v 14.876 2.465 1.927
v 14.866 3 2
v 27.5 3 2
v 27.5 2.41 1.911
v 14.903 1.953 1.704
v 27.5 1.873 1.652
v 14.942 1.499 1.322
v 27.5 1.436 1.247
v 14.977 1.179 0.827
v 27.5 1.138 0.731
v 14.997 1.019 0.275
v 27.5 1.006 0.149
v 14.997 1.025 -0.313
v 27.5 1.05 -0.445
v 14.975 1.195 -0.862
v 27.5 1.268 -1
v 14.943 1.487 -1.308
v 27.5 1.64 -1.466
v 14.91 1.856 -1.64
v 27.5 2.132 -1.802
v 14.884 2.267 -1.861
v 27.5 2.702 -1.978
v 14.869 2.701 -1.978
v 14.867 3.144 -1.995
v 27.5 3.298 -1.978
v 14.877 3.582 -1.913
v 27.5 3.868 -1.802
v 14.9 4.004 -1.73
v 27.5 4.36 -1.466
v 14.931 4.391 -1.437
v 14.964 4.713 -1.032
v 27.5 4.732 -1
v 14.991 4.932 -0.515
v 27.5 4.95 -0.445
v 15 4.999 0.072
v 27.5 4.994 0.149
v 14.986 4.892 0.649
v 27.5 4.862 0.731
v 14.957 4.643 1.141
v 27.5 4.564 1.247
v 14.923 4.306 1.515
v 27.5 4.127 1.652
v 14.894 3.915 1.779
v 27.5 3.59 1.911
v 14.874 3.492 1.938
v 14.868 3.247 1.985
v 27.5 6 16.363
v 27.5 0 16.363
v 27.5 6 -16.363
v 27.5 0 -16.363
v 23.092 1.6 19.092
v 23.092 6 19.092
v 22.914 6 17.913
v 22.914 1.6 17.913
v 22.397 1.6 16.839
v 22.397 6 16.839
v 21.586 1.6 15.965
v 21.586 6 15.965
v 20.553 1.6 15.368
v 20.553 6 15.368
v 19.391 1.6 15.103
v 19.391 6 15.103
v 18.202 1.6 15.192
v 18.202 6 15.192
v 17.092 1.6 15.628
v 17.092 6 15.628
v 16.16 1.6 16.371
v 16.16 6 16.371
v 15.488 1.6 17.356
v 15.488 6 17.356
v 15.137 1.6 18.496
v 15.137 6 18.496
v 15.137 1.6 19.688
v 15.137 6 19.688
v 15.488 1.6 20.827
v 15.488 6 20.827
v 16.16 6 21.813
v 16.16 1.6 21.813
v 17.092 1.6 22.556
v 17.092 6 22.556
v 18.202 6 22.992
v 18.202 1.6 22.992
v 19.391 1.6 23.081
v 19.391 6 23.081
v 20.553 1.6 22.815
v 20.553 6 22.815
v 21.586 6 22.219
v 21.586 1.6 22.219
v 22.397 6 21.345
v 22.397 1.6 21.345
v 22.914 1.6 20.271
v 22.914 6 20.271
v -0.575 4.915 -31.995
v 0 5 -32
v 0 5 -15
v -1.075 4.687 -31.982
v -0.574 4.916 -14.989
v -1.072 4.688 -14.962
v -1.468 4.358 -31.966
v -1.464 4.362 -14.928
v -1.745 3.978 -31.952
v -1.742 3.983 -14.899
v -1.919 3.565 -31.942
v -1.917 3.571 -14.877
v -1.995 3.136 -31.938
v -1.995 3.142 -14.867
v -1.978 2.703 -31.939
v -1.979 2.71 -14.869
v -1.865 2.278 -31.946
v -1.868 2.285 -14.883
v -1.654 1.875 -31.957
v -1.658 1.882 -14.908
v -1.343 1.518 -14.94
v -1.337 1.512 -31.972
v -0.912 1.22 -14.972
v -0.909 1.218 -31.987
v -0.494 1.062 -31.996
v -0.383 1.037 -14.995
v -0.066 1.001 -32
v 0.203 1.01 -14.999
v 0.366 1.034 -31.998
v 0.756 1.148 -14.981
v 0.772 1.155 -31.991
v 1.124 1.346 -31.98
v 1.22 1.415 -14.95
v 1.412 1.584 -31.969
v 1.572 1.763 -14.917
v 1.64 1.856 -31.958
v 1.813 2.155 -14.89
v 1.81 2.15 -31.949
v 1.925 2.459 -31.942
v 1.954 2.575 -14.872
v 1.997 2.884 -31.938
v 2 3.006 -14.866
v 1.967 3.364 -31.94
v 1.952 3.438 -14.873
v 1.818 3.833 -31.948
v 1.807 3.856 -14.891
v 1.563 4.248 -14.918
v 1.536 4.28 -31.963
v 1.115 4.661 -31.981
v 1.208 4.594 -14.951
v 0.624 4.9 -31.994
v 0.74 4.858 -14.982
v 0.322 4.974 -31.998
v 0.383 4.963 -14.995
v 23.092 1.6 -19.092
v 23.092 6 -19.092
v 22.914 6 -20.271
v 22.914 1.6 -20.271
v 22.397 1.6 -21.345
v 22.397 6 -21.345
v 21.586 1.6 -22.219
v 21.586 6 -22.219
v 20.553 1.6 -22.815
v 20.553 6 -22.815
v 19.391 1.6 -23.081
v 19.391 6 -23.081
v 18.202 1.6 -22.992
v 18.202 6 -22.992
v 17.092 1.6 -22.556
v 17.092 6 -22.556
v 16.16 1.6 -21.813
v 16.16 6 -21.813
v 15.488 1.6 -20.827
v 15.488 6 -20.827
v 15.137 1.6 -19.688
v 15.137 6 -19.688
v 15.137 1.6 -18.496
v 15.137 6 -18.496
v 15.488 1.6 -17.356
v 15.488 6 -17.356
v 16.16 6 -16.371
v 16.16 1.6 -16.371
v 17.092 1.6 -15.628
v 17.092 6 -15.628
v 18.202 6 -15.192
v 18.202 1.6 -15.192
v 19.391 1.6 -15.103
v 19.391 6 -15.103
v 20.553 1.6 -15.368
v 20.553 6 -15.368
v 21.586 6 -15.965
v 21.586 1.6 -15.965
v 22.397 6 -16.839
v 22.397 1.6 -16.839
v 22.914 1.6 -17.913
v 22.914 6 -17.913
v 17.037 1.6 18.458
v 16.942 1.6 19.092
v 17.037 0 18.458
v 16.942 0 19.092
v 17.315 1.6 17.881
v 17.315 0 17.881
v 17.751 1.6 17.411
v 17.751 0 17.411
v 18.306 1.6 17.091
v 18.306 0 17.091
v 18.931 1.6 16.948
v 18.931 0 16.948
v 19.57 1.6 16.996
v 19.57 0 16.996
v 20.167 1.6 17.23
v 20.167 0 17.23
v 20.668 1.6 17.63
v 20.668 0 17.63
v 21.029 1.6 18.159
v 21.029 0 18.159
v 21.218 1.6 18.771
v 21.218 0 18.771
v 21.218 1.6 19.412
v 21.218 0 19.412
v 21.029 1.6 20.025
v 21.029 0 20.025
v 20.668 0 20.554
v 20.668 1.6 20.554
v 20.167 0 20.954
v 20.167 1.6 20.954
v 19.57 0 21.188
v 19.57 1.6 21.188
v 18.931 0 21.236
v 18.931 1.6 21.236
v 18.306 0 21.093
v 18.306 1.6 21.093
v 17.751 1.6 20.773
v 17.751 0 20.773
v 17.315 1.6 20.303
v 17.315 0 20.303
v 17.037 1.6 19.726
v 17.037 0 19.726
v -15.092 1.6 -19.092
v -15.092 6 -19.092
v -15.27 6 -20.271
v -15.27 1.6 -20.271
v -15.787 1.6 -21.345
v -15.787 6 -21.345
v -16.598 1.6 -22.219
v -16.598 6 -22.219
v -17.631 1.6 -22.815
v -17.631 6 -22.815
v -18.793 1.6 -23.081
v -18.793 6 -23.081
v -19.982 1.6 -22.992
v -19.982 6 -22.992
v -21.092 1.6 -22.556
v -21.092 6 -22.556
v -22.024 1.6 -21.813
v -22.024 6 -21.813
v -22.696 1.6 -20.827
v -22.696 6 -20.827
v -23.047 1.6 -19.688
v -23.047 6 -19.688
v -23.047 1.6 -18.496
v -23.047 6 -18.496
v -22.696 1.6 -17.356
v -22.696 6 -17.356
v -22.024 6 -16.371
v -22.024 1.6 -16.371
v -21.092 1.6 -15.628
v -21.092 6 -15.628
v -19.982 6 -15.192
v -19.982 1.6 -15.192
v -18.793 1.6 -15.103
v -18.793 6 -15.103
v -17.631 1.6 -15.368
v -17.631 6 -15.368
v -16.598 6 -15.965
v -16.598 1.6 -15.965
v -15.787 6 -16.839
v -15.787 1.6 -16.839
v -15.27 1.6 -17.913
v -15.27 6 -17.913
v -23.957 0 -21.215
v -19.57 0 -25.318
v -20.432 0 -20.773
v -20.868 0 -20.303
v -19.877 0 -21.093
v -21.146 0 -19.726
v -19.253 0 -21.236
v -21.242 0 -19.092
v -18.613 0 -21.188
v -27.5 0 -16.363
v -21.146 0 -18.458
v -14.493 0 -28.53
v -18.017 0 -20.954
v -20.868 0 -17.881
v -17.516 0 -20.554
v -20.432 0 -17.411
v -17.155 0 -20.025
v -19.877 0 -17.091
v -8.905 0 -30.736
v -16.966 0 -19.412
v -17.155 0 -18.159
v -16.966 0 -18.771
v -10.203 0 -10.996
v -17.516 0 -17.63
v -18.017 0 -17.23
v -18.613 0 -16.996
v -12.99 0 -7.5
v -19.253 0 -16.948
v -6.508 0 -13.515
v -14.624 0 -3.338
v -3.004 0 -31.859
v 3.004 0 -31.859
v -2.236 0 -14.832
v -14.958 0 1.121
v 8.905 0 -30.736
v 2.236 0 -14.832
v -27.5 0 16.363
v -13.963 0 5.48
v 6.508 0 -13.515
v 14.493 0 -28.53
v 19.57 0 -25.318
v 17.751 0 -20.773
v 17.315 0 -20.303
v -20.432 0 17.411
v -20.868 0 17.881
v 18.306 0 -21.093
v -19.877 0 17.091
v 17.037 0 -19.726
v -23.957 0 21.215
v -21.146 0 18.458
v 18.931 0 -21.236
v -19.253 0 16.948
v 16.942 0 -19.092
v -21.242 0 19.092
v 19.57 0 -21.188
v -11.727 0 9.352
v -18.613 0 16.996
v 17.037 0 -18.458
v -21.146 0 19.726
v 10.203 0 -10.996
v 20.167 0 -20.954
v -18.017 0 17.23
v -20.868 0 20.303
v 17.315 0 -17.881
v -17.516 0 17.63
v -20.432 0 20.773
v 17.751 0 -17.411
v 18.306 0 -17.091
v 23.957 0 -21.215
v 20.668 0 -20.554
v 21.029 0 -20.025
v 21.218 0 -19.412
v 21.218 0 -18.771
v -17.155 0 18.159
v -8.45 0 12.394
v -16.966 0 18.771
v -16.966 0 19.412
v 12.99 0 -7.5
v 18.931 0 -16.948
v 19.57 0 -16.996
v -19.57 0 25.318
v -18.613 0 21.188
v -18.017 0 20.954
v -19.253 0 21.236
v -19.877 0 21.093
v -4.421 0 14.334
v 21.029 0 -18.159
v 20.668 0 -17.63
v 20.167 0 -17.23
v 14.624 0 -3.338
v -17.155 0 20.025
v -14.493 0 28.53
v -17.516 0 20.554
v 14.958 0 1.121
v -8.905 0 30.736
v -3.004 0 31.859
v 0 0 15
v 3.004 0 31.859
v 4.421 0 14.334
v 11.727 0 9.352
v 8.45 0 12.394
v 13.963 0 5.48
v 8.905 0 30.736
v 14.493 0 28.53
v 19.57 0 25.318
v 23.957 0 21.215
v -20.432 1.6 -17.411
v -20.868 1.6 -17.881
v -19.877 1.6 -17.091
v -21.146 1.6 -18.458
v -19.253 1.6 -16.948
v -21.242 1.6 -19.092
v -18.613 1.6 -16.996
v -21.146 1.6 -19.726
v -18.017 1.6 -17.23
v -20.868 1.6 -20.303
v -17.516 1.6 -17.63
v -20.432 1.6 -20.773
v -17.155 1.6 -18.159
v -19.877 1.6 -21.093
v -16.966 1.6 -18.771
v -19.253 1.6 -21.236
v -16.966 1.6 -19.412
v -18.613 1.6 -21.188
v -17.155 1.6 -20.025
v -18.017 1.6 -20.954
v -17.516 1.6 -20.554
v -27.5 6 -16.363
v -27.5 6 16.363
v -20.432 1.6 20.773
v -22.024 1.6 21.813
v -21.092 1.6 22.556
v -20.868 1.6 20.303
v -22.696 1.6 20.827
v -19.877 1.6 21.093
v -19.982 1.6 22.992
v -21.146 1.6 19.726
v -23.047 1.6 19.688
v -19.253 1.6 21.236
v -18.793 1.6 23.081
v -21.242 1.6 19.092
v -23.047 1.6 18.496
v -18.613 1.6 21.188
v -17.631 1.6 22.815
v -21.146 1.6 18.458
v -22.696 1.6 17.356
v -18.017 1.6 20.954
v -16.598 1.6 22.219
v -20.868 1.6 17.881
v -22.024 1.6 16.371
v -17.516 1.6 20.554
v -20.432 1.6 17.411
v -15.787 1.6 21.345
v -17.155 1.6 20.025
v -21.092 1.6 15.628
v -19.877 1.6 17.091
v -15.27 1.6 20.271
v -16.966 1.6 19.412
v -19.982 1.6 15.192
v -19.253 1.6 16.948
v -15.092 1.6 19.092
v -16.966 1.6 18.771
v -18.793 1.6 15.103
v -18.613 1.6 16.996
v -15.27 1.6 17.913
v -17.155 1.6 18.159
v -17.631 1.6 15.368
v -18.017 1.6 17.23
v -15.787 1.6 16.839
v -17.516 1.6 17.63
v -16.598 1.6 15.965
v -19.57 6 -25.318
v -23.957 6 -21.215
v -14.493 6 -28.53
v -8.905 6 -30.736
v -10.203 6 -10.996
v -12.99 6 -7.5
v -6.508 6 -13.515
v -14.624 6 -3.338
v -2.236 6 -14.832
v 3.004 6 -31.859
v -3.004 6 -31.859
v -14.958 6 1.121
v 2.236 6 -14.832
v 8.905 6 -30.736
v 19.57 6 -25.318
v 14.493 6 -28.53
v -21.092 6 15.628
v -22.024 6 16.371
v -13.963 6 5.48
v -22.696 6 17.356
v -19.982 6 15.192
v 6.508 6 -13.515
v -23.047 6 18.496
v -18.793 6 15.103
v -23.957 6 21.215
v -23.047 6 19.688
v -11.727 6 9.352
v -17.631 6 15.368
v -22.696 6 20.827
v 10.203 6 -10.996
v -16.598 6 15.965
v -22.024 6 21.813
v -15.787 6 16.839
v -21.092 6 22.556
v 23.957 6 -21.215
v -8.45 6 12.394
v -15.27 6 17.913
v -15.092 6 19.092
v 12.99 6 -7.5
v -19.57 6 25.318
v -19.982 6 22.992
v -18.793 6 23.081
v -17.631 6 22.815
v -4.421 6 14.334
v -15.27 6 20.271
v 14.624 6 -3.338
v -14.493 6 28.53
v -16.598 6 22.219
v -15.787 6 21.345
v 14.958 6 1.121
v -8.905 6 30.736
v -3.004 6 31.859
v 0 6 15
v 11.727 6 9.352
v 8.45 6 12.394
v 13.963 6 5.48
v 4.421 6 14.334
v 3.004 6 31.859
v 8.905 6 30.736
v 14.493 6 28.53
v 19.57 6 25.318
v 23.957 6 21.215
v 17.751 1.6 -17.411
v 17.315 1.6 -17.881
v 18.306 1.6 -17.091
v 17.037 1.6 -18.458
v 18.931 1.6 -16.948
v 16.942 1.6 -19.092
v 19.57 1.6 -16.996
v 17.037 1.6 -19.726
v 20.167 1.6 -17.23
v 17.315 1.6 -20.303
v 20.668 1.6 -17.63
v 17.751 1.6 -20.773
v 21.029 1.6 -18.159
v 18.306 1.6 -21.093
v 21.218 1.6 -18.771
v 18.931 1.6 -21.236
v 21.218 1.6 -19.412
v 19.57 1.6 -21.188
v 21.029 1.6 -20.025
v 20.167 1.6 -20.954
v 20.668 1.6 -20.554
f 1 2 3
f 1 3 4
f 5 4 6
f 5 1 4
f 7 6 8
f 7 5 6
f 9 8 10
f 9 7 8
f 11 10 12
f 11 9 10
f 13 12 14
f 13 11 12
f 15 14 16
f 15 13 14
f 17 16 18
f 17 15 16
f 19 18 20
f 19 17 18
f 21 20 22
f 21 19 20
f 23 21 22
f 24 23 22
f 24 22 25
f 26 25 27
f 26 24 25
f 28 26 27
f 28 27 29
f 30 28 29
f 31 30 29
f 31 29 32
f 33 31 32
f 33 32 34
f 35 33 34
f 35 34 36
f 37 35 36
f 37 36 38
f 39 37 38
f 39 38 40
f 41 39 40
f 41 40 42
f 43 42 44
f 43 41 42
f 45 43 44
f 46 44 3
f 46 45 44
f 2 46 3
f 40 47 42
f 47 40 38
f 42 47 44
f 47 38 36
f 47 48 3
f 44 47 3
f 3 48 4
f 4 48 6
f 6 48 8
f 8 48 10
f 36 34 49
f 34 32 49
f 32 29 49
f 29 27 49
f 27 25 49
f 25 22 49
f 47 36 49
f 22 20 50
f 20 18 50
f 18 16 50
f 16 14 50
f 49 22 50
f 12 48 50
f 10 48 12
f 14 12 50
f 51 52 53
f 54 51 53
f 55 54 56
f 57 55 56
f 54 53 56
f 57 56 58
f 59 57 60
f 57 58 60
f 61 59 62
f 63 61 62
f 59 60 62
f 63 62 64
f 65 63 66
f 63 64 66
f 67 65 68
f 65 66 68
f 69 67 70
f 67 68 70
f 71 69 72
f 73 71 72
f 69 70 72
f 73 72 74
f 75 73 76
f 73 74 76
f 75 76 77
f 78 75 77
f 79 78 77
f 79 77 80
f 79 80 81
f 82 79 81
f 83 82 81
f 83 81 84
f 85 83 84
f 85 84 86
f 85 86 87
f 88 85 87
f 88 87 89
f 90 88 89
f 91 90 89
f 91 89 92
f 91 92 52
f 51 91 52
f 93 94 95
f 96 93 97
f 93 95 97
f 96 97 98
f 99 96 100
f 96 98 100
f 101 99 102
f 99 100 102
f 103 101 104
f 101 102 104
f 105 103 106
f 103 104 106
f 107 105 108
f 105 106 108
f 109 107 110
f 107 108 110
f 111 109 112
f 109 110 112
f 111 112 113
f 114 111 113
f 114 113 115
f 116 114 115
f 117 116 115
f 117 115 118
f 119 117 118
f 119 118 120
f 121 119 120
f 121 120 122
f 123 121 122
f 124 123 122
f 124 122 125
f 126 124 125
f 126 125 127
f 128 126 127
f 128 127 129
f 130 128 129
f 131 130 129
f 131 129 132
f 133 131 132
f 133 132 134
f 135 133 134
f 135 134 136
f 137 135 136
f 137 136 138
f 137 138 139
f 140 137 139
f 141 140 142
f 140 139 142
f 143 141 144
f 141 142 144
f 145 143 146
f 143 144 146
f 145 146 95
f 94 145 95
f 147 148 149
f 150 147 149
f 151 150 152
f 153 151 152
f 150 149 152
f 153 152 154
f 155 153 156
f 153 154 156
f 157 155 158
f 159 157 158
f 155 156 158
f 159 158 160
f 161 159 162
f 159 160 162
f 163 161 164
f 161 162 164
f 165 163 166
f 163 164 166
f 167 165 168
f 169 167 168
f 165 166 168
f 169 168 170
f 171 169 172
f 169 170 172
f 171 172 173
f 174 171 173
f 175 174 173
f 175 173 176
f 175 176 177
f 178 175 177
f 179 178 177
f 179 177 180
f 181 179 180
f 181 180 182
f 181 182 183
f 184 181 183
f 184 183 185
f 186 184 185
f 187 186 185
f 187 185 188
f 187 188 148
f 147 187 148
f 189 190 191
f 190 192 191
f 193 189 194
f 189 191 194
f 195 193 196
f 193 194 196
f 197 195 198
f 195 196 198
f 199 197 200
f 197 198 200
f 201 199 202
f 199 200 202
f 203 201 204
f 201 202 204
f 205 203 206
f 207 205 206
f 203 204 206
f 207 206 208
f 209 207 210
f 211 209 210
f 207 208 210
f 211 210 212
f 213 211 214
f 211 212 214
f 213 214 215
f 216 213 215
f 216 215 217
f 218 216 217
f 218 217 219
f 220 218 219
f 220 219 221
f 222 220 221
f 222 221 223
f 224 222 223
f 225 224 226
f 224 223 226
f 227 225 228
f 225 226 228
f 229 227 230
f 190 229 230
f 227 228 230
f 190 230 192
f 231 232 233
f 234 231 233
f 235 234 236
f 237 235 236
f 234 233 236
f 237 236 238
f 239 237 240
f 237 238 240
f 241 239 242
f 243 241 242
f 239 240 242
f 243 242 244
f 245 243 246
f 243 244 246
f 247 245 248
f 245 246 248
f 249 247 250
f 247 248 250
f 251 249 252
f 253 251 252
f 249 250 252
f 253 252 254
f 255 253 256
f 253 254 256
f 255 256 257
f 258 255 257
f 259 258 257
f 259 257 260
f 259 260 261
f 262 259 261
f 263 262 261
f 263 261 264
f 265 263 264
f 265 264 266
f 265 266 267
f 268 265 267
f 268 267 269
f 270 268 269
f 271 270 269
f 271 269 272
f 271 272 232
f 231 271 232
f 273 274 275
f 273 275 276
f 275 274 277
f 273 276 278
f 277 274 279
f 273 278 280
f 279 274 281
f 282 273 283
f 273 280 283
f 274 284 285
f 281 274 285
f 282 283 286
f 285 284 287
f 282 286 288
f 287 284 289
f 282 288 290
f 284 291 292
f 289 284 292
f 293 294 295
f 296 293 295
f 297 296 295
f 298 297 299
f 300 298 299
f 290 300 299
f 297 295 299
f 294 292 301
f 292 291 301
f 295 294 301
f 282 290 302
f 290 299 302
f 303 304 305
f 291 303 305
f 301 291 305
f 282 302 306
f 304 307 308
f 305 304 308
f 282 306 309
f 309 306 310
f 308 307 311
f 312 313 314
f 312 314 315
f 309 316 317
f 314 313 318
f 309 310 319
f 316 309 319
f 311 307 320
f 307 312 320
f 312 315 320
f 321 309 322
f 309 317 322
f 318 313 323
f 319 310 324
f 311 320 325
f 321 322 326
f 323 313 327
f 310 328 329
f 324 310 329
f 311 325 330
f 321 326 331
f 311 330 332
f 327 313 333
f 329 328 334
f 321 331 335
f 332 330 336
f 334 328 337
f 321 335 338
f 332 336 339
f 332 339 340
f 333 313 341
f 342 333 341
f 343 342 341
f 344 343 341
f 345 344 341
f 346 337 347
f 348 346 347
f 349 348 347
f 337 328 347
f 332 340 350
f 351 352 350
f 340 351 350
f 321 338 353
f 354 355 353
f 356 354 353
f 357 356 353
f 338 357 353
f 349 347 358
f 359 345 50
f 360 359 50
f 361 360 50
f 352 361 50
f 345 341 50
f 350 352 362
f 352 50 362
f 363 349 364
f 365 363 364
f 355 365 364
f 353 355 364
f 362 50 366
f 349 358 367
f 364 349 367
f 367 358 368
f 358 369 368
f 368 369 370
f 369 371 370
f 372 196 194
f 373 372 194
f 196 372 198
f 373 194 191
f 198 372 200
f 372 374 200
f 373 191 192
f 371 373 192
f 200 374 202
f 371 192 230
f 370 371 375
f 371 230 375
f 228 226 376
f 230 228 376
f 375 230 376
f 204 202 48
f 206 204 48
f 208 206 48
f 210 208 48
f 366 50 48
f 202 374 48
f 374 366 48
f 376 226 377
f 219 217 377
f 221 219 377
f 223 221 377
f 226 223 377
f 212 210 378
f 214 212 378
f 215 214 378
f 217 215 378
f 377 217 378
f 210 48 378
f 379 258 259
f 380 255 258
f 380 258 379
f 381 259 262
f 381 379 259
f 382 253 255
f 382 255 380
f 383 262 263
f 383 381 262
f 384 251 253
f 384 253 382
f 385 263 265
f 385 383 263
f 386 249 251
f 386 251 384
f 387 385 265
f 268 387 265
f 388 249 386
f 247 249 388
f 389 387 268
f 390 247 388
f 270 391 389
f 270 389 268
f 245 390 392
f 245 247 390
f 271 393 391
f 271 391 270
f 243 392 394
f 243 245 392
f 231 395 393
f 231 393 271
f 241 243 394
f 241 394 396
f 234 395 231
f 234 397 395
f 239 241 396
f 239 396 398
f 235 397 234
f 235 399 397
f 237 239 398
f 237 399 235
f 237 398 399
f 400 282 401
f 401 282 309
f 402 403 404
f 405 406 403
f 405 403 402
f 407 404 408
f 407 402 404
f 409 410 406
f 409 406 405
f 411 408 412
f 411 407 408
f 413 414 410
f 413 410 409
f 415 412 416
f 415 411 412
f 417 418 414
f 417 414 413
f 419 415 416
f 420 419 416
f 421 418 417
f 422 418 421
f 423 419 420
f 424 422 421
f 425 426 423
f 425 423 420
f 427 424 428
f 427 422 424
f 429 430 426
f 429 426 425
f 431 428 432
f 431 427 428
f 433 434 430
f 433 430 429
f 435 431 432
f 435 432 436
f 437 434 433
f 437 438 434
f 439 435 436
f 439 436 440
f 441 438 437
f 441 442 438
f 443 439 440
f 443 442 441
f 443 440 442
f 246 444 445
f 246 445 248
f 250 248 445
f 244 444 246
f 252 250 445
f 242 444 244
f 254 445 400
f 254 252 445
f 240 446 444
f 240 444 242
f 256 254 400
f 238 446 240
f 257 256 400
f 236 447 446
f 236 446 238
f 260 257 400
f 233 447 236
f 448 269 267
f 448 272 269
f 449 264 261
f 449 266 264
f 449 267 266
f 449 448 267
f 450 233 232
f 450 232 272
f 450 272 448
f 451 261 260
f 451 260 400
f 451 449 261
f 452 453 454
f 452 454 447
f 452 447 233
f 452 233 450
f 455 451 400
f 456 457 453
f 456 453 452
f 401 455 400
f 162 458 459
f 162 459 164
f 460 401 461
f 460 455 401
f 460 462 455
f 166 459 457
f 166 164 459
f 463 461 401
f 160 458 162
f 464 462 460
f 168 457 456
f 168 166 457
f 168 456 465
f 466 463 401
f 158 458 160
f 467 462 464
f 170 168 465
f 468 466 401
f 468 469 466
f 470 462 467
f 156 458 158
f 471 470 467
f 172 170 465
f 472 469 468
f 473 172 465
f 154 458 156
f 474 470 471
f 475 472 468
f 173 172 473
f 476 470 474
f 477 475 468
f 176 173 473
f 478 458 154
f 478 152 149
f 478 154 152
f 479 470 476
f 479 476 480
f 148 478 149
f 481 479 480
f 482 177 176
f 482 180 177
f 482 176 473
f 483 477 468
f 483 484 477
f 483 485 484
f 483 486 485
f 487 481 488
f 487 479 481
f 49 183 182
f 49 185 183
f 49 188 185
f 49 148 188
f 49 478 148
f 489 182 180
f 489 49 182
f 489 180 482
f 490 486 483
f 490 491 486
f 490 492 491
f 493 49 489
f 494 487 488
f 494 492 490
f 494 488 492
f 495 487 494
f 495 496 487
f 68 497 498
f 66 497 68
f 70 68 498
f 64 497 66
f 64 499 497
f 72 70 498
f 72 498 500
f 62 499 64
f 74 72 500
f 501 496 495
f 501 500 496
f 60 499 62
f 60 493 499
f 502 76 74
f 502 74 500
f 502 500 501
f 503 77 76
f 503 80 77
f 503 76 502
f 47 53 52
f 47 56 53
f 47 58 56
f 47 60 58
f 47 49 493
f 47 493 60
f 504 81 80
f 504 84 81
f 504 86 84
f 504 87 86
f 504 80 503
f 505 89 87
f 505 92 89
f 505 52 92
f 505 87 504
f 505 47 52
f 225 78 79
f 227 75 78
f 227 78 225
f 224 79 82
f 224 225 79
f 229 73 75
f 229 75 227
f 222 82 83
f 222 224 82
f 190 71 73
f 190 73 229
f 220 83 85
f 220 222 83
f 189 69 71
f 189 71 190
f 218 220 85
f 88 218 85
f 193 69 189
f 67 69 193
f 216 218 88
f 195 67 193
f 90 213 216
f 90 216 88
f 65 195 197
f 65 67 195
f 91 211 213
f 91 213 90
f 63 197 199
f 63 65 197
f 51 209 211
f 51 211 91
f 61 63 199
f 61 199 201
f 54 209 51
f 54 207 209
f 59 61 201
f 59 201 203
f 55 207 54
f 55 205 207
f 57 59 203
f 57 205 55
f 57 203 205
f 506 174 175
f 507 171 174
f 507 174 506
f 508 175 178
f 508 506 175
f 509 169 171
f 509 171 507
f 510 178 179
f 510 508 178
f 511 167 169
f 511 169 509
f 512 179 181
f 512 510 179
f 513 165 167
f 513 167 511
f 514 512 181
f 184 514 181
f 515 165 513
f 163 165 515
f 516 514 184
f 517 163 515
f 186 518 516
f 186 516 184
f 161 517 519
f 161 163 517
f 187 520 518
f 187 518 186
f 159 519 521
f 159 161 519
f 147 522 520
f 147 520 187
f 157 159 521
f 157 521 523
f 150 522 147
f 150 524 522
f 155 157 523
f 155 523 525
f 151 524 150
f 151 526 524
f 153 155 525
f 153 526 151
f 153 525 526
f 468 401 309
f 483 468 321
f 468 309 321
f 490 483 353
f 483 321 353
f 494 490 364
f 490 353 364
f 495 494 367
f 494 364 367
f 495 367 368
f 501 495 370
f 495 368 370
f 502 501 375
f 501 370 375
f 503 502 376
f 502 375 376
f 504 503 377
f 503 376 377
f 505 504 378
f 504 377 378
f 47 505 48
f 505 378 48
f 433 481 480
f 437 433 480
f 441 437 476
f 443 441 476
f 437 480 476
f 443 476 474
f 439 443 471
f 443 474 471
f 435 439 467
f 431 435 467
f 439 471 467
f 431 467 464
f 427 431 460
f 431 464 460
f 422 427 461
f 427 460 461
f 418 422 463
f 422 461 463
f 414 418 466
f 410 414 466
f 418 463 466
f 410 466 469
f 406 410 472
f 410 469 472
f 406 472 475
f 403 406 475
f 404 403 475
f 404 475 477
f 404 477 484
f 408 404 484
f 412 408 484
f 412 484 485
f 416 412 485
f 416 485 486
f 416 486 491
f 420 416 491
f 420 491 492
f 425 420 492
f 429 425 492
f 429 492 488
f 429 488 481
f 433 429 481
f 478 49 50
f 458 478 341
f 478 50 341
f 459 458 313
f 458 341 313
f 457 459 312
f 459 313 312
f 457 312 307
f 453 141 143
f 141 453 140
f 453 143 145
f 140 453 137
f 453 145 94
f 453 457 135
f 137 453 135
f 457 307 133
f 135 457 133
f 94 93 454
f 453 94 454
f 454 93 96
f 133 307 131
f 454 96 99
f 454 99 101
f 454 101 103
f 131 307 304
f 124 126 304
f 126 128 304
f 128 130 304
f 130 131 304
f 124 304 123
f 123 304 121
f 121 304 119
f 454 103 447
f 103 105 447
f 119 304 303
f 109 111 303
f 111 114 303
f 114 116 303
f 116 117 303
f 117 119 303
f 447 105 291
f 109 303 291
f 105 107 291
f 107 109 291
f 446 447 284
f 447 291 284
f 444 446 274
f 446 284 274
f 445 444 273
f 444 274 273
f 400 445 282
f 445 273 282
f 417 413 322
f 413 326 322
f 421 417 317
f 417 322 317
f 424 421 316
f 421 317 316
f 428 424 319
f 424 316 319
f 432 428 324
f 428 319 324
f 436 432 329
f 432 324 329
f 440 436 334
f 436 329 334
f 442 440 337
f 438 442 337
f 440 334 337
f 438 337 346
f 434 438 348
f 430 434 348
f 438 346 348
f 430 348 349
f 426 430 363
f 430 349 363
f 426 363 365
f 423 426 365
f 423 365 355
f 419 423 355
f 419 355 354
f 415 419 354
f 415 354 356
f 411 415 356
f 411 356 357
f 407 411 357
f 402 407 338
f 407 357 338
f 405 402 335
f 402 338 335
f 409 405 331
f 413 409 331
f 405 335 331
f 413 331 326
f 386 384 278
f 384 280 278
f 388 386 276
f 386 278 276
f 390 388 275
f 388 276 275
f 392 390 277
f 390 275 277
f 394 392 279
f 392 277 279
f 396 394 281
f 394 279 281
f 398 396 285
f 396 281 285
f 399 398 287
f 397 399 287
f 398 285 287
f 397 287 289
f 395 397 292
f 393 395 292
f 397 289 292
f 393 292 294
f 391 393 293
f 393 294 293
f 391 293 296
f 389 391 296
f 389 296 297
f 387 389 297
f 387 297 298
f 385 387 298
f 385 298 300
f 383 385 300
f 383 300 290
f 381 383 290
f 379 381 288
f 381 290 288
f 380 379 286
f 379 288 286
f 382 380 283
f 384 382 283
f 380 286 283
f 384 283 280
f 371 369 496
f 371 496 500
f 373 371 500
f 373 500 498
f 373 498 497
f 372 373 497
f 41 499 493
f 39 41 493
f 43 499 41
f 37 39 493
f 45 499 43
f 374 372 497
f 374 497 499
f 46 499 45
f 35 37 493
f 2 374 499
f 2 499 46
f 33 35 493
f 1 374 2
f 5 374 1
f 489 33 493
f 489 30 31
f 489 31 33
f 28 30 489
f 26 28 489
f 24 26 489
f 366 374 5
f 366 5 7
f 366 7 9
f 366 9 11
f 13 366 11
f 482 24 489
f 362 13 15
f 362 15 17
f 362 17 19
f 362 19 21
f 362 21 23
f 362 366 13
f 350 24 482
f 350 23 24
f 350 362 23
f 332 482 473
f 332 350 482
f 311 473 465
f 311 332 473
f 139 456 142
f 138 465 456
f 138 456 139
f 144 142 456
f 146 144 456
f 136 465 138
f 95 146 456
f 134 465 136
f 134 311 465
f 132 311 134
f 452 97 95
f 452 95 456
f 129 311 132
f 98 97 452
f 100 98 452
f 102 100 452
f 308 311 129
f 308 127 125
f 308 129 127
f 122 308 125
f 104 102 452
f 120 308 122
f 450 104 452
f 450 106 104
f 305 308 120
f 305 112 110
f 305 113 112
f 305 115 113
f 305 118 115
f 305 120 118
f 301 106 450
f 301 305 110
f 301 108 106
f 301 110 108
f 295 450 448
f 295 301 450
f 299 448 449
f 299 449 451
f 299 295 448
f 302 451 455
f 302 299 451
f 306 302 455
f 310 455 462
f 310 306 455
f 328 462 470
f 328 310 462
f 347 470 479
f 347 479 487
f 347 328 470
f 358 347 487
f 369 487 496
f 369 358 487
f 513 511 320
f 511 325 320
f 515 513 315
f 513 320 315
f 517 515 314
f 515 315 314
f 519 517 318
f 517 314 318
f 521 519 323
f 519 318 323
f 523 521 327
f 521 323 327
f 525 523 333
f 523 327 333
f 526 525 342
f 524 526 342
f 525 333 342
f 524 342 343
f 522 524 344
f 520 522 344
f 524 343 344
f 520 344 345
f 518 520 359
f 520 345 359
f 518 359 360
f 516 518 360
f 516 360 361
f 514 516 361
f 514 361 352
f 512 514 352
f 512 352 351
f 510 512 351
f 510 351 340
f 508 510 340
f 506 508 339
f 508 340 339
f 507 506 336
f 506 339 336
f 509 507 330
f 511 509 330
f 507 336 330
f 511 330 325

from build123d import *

# Parameters (mm, degrees)
SKETCH1_R                                           = 32
SKETCH1_R_2                                         = 15
BOSS_EXTRUDE1_DEPTH                                 = 6
CBORE_FOR_M4_HEX_SOCKET_HEAD_CAP_SCREW2_D           = 4.3
CBORE_FOR_M4_HEX_SOCKET_HEAD_CAP_SCREW2_DEPTH       = 11.94
CBORE_FOR_M4_HEX_SOCKET_HEAD_CAP_SCREW2_CBORE_D     = 8
CBORE_FOR_M4_HEX_SOCKET_HEAD_CAP_SCREW2_CBORE_DEPTH = 4.4
CBORE_FOR_M4_HEX_SOCKET_HEAD_CAP_SCREW2_TIP         = 1.291850331
SKETCH7_R                                           = 2
CUT_EXTRUDE1_DEPTH                                  = 44.5
SKETCH8_R                                           = 2
CUT_EXTRUDE2_DEPTH                                  = 44.5
CUT_EXTRUDE3_START                                  = -10
CUT_EXTRUDE3_DEPTH                                  = 10


with BuildPart() as part:
    # Sketch1 → Boss-Extrude1 (new body)
    with BuildSketch(Plane(origin=(0, 0, 0), x_dir=(1, 0, 0), z_dir=(0, 1, 0))):
        with Locations(Location((0, 0, 0), (0, 0, 270))):
            Circle(SKETCH1_R)
        with Locations(Location((0, 0, 0), (0, 0, 270))):
            Circle(SKETCH1_R_2, mode=Mode.SUBTRACT)
    extrude(amount=BOSS_EXTRUDE1_DEPTH)

    # CBORE for M4 Hex Socket Head Cap Screw2
    with Locations(Plane(origin=(0, 6, 0), x_dir=(1, 0, 0), z_dir=(0, 1, 0))):
        with Locations((19.091883092, 19.091883092), (19.091883092, -19.091883092), (-19.091883092, -19.091883092), (-19.091883092, 19.091883092)):
            CounterBoreHole(CBORE_FOR_M4_HEX_SOCKET_HEAD_CAP_SCREW2_D / 2, CBORE_FOR_M4_HEX_SOCKET_HEAD_CAP_SCREW2_CBORE_D / 2, CBORE_FOR_M4_HEX_SOCKET_HEAD_CAP_SCREW2_CBORE_DEPTH, depth=CBORE_FOR_M4_HEX_SOCKET_HEAD_CAP_SCREW2_DEPTH)
            with Locations((0, 0, -(CBORE_FOR_M4_HEX_SOCKET_HEAD_CAP_SCREW2_DEPTH + CBORE_FOR_M4_HEX_SOCKET_HEAD_CAP_SCREW2_TIP / 2))):  # 118° drill point
                Cone(0, CBORE_FOR_M4_HEX_SOCKET_HEAD_CAP_SCREW2_D / 2, CBORE_FOR_M4_HEX_SOCKET_HEAD_CAP_SCREW2_TIP, mode=Mode.SUBTRACT)

    # Sketch7 → Cut-Extrude1 (cut)
    with BuildSketch(Plane(origin=(0, 0, 0), x_dir=(0, 0, -1), z_dir=(1, 0, 0))):
        with Locations(Location((0, 3, 0), (0, 0, 180))):
            Circle(SKETCH7_R)
    extrude(amount=CUT_EXTRUDE1_DEPTH, mode=Mode.SUBTRACT)

    # Sketch8 → Cut-Extrude2 (cut)
    with BuildSketch(Plane.XY):
        with Locations(Location((0, 3, 0), (0, 0, 90))):
            Circle(SKETCH8_R)
    extrude(amount=-CUT_EXTRUDE2_DEPTH, mode=Mode.SUBTRACT)

    # Sketch9 → Cut-Extrude3 (cut)
    with BuildSketch(Plane(origin=(0, 6, 0), x_dir=(1, 0, 0), z_dir=(0, 1, 0)).offset(CUT_EXTRUDE3_START)):
        with BuildLine():
            Line((-27.5, 16.363068172), (-27.5, -16.363068172))
            ThreePointArc((-27.5, -16.363068172), (-32, 0), (-27.5, 16.363068172))
        make_face()
        with BuildLine():
            Line((27.5, -16.363068172), (27.5, 16.363068172))
            ThreePointArc((27.5, 16.363068172), (32, 0), (27.5, -16.363068172))
        make_face()
    extrude(amount=CUT_EXTRUDE3_DEPTH, mode=Mode.SUBTRACT)


solid = part.part
